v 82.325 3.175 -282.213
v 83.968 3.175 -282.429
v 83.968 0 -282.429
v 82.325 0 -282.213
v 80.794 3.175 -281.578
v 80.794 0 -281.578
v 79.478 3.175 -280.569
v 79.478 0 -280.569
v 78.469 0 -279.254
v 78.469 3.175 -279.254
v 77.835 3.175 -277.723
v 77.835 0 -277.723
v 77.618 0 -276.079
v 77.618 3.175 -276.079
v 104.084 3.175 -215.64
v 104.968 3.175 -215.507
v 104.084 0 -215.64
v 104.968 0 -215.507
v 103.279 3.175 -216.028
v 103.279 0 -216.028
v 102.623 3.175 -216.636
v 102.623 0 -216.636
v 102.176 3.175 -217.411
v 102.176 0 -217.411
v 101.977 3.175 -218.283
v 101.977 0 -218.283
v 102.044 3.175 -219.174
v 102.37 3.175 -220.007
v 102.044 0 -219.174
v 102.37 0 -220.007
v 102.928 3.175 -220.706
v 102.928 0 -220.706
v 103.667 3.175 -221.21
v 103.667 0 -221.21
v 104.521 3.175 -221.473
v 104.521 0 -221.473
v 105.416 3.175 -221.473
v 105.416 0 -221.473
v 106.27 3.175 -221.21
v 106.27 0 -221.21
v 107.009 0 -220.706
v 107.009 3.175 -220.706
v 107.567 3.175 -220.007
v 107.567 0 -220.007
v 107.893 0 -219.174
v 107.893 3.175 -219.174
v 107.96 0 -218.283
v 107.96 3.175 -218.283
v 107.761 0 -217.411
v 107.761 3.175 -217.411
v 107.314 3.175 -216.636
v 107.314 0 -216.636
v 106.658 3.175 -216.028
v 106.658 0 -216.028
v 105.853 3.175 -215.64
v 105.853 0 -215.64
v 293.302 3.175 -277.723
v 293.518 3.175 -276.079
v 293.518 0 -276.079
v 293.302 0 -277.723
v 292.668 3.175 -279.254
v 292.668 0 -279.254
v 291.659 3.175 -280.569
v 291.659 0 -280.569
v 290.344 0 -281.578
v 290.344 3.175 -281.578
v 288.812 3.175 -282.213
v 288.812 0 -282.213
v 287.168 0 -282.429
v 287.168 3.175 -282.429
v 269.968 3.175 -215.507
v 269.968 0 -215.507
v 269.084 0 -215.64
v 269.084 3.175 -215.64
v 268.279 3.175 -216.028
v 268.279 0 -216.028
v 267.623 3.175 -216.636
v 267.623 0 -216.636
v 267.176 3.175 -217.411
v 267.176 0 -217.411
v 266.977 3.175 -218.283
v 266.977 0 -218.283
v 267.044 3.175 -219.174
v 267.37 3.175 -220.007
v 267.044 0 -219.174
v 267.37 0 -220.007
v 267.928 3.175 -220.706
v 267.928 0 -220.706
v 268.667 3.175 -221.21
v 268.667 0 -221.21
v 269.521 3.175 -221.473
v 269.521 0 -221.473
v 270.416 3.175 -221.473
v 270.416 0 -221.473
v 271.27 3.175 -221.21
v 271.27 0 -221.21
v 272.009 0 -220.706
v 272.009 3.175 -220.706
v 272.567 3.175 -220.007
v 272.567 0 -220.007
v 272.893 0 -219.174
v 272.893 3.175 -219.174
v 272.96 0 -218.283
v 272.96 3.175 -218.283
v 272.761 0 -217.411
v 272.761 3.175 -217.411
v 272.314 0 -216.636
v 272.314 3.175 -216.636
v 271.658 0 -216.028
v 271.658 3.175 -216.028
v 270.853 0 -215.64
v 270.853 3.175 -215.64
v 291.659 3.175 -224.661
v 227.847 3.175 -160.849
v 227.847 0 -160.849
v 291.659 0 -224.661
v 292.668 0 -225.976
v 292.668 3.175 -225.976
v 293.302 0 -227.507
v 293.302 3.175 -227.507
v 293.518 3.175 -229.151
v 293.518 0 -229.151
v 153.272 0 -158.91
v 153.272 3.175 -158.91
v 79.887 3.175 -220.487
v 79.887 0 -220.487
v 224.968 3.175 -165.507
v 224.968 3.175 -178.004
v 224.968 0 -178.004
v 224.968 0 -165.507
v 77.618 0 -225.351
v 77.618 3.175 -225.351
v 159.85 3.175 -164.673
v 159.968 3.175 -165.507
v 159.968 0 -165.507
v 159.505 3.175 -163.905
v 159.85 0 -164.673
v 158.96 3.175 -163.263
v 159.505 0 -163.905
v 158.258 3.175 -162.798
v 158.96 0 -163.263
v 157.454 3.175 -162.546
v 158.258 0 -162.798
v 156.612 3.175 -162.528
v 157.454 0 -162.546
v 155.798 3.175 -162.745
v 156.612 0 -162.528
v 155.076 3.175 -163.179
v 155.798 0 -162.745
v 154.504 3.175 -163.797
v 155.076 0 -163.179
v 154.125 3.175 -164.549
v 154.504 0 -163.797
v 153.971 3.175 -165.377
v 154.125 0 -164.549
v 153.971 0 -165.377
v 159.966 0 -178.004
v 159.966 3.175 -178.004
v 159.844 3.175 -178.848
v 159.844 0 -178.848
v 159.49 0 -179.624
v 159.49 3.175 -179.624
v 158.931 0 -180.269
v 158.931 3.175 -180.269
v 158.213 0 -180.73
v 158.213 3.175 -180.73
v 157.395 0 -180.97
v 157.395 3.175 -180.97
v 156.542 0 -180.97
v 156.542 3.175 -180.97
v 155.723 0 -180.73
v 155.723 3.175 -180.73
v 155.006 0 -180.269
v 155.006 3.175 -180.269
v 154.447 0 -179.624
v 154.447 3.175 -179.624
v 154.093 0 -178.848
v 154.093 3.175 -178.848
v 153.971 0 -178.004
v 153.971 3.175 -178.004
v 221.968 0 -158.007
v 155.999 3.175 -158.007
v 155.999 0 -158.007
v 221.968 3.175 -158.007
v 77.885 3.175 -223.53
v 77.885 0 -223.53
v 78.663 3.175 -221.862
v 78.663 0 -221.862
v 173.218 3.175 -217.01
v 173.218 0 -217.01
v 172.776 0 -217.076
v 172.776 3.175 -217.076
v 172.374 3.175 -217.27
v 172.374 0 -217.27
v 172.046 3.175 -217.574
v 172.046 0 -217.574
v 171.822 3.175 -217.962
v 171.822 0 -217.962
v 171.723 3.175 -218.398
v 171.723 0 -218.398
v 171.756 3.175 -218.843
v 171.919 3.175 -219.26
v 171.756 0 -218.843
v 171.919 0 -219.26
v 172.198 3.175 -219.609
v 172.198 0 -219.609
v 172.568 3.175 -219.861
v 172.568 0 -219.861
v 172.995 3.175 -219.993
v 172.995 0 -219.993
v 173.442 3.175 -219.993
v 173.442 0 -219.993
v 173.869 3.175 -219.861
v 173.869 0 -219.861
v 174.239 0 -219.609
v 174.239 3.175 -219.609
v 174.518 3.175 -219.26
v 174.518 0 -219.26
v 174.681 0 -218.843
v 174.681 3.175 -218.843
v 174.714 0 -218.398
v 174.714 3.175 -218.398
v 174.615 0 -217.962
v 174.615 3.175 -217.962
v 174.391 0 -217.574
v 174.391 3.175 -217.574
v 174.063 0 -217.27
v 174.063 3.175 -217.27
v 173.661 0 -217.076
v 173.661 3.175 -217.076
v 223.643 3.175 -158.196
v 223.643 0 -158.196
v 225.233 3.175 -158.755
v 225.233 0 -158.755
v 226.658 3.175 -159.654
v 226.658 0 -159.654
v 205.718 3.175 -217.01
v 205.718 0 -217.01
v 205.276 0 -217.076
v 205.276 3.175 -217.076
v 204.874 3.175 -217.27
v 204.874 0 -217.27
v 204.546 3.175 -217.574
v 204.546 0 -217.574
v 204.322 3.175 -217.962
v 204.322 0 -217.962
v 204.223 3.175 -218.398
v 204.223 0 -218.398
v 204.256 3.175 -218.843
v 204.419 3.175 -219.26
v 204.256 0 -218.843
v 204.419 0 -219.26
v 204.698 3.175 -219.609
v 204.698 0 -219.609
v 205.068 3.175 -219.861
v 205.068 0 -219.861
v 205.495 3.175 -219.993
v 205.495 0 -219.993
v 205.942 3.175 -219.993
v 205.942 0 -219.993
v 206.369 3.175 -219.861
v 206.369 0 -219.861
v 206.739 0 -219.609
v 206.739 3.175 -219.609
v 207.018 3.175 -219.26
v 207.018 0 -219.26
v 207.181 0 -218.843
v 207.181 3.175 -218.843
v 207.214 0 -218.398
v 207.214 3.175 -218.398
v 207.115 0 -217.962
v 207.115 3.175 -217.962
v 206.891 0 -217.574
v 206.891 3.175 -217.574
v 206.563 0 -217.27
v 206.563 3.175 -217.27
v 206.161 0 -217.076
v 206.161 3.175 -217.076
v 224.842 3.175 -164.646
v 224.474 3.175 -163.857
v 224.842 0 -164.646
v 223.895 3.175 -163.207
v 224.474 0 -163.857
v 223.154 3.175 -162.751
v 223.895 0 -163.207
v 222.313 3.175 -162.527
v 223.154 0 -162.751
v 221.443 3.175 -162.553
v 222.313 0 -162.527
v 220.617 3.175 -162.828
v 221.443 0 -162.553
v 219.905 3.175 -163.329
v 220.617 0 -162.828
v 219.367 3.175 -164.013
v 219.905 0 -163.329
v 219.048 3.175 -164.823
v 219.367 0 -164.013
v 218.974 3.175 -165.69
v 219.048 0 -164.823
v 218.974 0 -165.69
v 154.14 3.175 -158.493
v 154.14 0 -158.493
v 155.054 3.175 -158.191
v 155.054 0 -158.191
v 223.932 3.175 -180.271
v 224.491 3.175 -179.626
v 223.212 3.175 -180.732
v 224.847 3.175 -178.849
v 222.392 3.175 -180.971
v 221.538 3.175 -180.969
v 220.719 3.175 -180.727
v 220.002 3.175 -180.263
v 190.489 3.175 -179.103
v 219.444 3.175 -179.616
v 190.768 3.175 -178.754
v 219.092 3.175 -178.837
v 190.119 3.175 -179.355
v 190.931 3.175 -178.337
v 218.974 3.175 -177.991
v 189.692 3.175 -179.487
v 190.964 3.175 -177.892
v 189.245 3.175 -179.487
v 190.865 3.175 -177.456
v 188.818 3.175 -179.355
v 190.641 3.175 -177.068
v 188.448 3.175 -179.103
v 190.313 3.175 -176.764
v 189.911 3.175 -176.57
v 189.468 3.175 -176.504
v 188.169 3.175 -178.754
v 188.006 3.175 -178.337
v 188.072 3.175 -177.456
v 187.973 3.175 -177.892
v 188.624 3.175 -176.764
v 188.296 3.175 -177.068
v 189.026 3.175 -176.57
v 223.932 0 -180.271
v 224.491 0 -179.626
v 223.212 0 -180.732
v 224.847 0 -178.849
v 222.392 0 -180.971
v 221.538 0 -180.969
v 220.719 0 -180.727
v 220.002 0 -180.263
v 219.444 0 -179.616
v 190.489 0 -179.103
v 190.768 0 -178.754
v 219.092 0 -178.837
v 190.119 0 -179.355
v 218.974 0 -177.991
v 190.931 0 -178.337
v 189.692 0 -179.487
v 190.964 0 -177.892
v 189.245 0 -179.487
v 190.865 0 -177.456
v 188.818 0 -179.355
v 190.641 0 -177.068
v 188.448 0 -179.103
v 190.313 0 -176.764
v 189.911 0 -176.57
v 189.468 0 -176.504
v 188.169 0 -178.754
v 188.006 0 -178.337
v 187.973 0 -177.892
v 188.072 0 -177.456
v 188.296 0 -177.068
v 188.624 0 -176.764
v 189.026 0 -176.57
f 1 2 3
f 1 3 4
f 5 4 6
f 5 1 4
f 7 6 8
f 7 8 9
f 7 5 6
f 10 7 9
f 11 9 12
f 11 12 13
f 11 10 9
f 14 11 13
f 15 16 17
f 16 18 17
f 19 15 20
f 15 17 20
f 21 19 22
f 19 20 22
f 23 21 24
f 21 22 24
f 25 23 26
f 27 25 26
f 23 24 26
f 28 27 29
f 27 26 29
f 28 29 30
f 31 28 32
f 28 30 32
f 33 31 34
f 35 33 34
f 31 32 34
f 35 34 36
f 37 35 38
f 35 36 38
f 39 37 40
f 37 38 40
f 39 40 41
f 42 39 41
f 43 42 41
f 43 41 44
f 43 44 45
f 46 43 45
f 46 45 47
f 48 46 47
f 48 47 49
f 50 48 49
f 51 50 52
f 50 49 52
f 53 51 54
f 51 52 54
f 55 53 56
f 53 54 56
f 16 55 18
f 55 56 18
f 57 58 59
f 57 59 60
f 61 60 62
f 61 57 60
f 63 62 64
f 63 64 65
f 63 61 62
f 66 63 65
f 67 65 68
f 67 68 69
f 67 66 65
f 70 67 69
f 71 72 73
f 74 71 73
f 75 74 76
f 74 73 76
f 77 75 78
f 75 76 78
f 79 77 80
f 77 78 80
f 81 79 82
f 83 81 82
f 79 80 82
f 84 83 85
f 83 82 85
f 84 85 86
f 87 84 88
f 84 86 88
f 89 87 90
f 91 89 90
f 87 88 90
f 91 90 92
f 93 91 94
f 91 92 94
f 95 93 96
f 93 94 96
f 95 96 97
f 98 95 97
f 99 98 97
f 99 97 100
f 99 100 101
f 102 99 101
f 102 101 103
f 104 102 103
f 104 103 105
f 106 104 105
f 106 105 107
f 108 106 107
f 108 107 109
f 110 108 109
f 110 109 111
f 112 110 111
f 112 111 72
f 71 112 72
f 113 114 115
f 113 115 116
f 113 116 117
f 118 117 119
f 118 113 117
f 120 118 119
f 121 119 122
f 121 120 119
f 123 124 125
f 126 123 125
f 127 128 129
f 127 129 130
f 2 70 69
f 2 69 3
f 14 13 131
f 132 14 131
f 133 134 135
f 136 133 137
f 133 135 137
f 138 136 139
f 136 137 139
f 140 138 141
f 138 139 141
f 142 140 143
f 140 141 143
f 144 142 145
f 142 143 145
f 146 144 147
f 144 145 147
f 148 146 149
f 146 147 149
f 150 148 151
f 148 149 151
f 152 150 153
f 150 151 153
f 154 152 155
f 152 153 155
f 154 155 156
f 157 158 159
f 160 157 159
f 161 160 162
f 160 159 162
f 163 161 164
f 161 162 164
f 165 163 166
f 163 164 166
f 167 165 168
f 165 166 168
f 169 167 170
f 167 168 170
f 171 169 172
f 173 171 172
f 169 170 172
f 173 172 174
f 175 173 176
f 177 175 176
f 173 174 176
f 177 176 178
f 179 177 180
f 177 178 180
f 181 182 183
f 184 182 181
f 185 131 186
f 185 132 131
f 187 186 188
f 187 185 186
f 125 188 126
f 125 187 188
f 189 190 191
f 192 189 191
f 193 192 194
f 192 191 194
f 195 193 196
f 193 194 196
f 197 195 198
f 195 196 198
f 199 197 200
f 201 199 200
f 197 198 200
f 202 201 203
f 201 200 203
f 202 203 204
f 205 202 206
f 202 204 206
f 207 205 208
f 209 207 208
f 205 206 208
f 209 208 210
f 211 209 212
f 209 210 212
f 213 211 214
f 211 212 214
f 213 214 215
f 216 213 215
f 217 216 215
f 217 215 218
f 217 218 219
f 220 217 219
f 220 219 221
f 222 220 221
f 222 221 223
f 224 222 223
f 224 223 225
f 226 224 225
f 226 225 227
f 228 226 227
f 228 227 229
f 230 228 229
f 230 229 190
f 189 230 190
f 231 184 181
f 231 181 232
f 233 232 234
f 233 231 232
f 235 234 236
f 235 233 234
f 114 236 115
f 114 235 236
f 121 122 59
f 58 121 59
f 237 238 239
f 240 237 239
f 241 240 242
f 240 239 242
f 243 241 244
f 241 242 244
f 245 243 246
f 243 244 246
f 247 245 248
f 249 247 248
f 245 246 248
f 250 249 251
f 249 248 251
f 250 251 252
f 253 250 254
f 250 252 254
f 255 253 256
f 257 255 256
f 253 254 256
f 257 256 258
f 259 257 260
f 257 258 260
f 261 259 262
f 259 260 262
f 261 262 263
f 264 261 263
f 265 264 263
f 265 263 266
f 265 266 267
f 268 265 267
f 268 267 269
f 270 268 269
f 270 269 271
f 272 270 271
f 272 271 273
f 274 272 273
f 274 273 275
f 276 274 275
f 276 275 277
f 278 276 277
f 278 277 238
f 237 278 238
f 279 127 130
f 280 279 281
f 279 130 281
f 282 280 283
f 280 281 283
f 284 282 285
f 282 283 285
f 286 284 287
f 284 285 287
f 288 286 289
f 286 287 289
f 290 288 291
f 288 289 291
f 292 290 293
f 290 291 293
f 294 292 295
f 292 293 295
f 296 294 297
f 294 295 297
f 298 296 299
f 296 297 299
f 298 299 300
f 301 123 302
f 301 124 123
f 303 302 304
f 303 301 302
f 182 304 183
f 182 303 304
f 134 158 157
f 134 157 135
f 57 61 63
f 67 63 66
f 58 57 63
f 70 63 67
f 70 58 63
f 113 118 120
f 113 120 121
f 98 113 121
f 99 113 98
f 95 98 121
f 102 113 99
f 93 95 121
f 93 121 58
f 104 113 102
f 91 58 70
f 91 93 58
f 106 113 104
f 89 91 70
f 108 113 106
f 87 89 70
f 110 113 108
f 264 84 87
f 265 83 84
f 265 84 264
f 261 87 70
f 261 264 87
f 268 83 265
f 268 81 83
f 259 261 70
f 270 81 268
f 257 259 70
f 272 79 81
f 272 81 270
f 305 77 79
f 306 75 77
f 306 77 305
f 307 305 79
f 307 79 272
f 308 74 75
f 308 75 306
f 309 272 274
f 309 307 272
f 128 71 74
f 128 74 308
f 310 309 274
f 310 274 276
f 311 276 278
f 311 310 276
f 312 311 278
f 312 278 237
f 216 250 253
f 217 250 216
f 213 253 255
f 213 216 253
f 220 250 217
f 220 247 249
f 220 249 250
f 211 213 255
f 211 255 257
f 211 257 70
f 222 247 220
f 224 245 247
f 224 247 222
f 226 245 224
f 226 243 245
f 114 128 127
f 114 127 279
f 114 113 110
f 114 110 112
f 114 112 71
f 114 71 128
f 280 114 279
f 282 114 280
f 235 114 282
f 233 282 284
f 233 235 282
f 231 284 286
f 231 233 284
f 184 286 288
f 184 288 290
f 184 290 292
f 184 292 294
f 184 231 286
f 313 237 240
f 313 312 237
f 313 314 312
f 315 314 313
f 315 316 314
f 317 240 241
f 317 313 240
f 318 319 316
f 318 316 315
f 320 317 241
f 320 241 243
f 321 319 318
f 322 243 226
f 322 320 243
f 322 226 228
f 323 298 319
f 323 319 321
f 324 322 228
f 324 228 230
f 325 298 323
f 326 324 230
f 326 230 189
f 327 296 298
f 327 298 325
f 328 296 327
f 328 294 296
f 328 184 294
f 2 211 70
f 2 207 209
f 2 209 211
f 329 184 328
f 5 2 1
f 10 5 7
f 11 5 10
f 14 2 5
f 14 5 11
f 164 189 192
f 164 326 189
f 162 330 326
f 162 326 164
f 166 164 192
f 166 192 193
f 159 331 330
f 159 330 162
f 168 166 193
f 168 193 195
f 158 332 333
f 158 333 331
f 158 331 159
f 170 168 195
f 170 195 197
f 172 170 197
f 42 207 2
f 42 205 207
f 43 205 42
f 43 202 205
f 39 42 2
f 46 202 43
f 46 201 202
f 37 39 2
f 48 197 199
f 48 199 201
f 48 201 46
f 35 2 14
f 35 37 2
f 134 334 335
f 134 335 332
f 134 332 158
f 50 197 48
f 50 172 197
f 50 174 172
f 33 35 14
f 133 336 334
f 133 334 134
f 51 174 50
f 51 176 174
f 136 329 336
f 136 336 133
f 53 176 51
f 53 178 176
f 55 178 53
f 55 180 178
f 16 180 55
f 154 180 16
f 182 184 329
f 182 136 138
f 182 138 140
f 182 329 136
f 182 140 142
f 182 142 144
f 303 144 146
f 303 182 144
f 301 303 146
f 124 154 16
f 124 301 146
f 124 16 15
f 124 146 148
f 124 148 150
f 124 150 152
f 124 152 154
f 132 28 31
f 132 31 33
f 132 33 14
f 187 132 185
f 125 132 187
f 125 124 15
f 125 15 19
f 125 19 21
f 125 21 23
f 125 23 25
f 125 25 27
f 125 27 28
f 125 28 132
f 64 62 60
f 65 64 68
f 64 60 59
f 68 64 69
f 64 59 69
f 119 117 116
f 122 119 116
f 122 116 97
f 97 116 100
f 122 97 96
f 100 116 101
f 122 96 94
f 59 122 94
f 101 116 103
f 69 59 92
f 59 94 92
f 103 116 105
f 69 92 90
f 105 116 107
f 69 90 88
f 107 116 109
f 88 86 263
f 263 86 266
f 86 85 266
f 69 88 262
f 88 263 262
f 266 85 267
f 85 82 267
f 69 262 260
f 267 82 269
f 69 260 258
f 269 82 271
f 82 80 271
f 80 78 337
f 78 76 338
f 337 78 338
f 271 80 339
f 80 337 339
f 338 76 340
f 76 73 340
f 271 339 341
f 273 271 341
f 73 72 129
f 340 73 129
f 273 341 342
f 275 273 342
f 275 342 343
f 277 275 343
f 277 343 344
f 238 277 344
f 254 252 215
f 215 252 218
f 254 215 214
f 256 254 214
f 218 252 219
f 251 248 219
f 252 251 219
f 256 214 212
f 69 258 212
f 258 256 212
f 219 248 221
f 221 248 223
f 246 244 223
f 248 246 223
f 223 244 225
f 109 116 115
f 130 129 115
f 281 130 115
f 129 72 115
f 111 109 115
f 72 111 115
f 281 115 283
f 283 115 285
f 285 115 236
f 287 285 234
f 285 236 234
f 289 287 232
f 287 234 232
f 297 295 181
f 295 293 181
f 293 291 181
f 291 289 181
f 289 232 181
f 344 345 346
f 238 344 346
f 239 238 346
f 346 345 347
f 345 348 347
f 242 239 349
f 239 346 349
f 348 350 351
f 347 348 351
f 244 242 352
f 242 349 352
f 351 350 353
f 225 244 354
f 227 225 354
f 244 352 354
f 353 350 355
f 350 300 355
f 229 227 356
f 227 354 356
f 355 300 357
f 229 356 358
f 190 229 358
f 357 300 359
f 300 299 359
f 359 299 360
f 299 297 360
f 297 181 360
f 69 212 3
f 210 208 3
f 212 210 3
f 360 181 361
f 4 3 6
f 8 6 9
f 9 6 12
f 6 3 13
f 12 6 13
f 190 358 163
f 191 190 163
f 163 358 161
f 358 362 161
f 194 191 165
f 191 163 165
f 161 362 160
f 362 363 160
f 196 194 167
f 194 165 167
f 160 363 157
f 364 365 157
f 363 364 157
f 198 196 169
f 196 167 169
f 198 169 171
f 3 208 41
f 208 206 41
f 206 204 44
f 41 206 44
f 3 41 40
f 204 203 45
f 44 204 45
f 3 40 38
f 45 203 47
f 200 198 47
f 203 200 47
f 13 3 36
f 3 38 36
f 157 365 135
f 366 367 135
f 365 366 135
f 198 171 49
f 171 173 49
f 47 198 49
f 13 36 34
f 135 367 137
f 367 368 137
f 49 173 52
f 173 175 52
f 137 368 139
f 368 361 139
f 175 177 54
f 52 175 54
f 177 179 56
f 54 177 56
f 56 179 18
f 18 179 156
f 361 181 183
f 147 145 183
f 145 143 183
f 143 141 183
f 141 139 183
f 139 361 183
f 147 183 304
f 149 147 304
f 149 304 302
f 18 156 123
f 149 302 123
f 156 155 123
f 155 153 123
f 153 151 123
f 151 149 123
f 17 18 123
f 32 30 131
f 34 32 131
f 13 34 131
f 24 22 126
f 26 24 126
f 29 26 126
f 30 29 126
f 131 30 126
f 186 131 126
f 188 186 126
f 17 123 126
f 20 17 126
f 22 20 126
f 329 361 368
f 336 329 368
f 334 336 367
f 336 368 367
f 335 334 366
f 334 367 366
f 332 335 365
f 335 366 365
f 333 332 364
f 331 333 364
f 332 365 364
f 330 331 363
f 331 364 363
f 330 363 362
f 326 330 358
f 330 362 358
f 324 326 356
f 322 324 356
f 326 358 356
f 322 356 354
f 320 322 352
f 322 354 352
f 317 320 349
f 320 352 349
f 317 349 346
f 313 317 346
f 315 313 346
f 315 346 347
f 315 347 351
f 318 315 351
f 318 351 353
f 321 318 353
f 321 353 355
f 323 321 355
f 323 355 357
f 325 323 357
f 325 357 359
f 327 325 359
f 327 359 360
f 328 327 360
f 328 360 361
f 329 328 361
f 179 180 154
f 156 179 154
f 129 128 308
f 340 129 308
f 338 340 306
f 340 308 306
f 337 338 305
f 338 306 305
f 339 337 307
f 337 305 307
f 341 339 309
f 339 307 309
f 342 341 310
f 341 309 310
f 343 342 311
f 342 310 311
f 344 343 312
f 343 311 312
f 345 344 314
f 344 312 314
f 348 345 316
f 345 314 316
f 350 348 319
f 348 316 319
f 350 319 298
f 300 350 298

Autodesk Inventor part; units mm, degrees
ref_plane "YZ Plane" through (0, 0, 0) normal (1, 0, 0) x (0, 1, 0)
ref_plane "XZ Plane" through (0, 0, 0) normal (0, 1, 0) x (-1, 0, 0)
ref_plane "XY Plane" through (0, 0, 0) normal (0, 0, 1) x (1, 0, 0)
sketch "Sketch1" plane through (0, 0, 0) normal (0, 1, 0) x (-1, 0, 0)
  line L0 (-77.6185, -139.5068) -> (-293.5185, -139.5068)
  line L1 (-293.5185, -139.5068) -> (-293.5185, -291.9068)
  line L2 (-293.5185, -291.9068) -> (-77.6185, -291.9068)
  line L3 (-77.6185, -291.9068) -> (-77.6185, -139.5068)
  point P0 (0, 0)
  dimension "d0" = 215.9
  dimension "d1" = 152.4
extrude "Extrusion1" add sketch "Sketch1" along normal blind 3.175
sketch "Sketch2" plane through (0, 3.175, 0) normal (0, 1, 0) x (1, 0, 0)
  line L0 (77.6185, 291.9068) -> (77.6185, 139.5068) projected
  line L1 (77.6185, 139.5068) -> (293.5185, 139.5068) projected
  line L2 (293.5185, 139.5068) -> (293.5185, 291.9068) projected
  line L3 (293.5185, 291.9068) -> (77.6185, 291.9068) projected
  point P0 (0, 0)
  point P1 (156.9685, 165.5068)
  point P2 (104.9685, 218.5068)
  point P3 (269.9685, 218.5068)
  point P4 (221.9685, 165.5068)
  dimension "d4" = 144.35
  dimension "d5" = 26
  dimension "d7" = 79
  dimension "d19" = 27.35
  dimension "d20" = 79
  dimension "d21" = 26
  dimension "d22" = 79.35
  dimension "d23" = 192.35
hole "Hole1" at (156.9685, 3.175, -165.5068) at (104.9685, 3.175, -218.5068) at (269.9685, 3.175, -218.5068) at (221.9685, 3.175, -165.5068) direction (0, -1, 0) diameter 6 end through all
sketch "Sketch3" plane through (0, 3.175, 0) normal (0, 1, 0) x (1, 0, 0)
  line L0 (155.9994, 158.0068) -> (221.9685, 158.0068)
  circle A0 centre (221.9685, 165.5068) radius 3 projected
  circle A1 centre (104.3905, 218.5068) radius 3
  circle A2 centre (156.9685, 165.5068) radius 3 projected
  line L1 (153.2717, 158.9097) -> (79.8868, 220.4869)
  line L2 (77.6185, 139.5068) -> (293.5185, 139.5068)
  line L3 (293.5185, 229.1509) -> (293.5185, 276.0791)
  line L4 (293.5185, 291.9068) -> (77.6185, 291.9068)
  line L5 (77.6185, 291.9068) -> (77.6185, 139.5068)
  arc A3 (153.2717, 158.9097) -> (155.9994, 158.0068) centre (156.9685, 165.5068) ccw
  line L6 (96.6333, 206.4349) -> (77.6185, 222.3902)
  line L7 (48.2791, 233.5068) -> (391.5458, 233.5068) construction
  arc A4 (221.9685, 158.0068) -> (227.8466, 160.8487) centre (221.9685, 165.5068) ccw
  line L8 (227.8466, 160.8487) -> (291.6586, 224.6608)
  line L9 (293.5185, 226.5206) -> (293.5185, 282.4291)
  line L10 (293.5185, 139.5068) -> (293.5185, 291.9068) projected
  line L11 (287.1685, 282.4291) -> (83.9685, 282.4291)
  line L12 (77.6185, 276.0791) -> (77.6185, 225.3513)
  line L13 (77.6185, 291.9068) -> (77.6185, 139.5068) projected
  arc A5 (293.5185, 276.0791) -> (287.1685, 282.4291) centre (287.1685, 276.0791) ccw
  arc A6 (83.9685, 282.4291) -> (77.6185, 276.0791) centre (83.9685, 276.0791) ccw
  arc A7 (77.6185, 225.3513) -> (79.8868, 220.4869) centre (83.9685, 225.3513) ccw
  arc A8 (291.6586, 224.6608) -> (293.5185, 229.1509) centre (287.1685, 229.1509) ccw
  point P0 (0, 0)
  point P1 (77.6185, 282.4291)
  point P2 (77.6185, 160.8487)
  dimension "d24" = 7.5
  dimension "d40" = 98.7582
  dimension "d72" = 6
  dimension "d93" = 7.5
  dimension "d96" = 52.578
  dimension "d99" = 135
  dimension "d100" = 6.35
  dimension "d101" = 6.35
  dimension "d102" = 6.35
  dimension "d103" = 6.35
  dimension "d104" = 140
extrude "Extrusion3" cut sketch "Sketch3" against normal blind 25.4 contours L0 A4 L8 A8 L9 L10 L2 L5 L6 L1 A3 | L6 L5 A7 | A5 L11 A6 L5 L4 L10 L9
sketch "Sketch7" plane through (0, 3.175, 0) normal (0, 1, 0) x (1, 0, 0)
  circle A0 centre (156.9685, 165.5068) radius 3 projected
  line L0 (155.9994, 158.0068) -> (221.9685, 158.0068) projected
  circle A1 centre (156.9685, 178.0036) radius 2.9972
  line L1 (153.9713, 178.0036) -> (153.9713, 165.3773)
  line L2 (159.9657, 178.0043) -> (159.9685, 165.5075)
  circle A2 centre (221.9713, 178.0036) radius 2.9972
  circle A3 centre (221.9685, 165.5068) radius 3 projected
  line L3 (218.9741, 178.016) -> (218.9741, 165.3232)
  line L4 (224.9685, 178.0036) -> (224.9685, 165.5068)
  point P0 (0, 0)
  point P1 (218.9685, 165.5082)
  dimension "d76" = 5.9944
  dimension "d77" = 12.4968
  dimension "d78" = 5.9944
  dimension "d79" = 12.4968
  dimension "d88" = 6
extrude "Extrusion4" cut sketch "Sketch7" against normal blind 25.4 contours A0 L1 A1 L2 | A1
sketch "Sketch8" plane through (0, 3.175, 0) normal (0, 1, 0) x (1, 0, 0)
  arc A0 (224.9685, 178.0036) -> (218.9741, 177.9913) centre (221.9713, 178.0036) ccw
  circle A1 centre (221.9685, 165.5068) radius 3
  line L0 (218.9741, 178.016) -> (218.9741, 165.3232)
  line L1 (224.9685, 178.0036) -> (224.9685, 165.5068)
  point P0 (0, 0)
  point P1 (218.9685, 165.5082)
  dimension "d82" = 5.9944
  dimension "d83" = 12.4968
extrude "Extrusion5" cut sketch "Sketch8" against normal blind 25.4 contours L1 A1 L0 A0 | A1 L0 picked at (221.9464, 164.5591)
sketch "Sketch9" plane through (0, 3.175, 0) normal (0, 1, 0) x (1, 0, 0)
  point P0 (0, 0)
sketch "Sketch5" plane through (0, 3.175, 0) normal (0, 1, 0) x (1, 0, 0)
  circle A0 centre (104.9685, 218.5068) radius 3 projected
  circle A1 centre (104.9685, 218.5068) radius 22.225
  circle A2 centre (156.9685, 165.5068) radius 3 projected
  circle A3 centre (156.9685, 165.5068) radius 22.225
  circle A4 centre (221.9685, 165.5068) radius 3 projected
  circle A5 centre (221.9685, 165.5068) radius 22.225
  circle A6 centre (269.9685, 218.5068) radius 3 projected
  circle A7 centre (269.9685, 218.5068) radius 22.225
  line L0 (155.9994, 158.0068) -> (221.9685, 158.0068) projected
  line L1 (274.8943, 278.8204) -> (98.1742, 278.8204) projected
  arc A8 (224.9685, 178.0036) -> (218.9741, 178.016) centre (221.9713, 178.0036) ccw projected
  point P0 (0, 0)
  point P1 (205.7185, 218.5096)
  point P2 (189.4685, 178.0036)
  point P3 (173.2185, 218.5096)
  dimension "d45" = 44.45
  dimension "d47" = 44.45
  dimension "d48" = 44.45
  dimension "d49" = 44.45
  dimension "d50" = 60.5028
  dimension "d52" = 65
  dimension "d53" = 16.25
  dimension "d54" = 16.25
  dimension "d55" = 60.5028
  dimension "d58" = 52
  dimension "d62" = 32.5
  dimension "d95" = 60.3136
  dimension "d125" = 0
hole "Hole2" at (205.7185, 3.175, -218.5096) at (189.4685, 3.175, -178.0036) at (173.2185, 3.175, -218.5096) direction (0, -1, 0) diameter 3 end through all
sketch "Sketch11" plane through (0, 3.175, 0) normal (0, 1, 0) x (1, 0, 0)
  circle A0 centre (18.0131, 10.4316) radius 1.3525
  circle A1 centre (18.0131, 10.4316) radius 1.3525
  circle A2 centre (18.0131, 24.2612) radius 1.3525
  circle A3 centre (18.0131, 24.2612) radius 1.3525
  circle A4 centre (31.8426, 24.2612) radius 1.3525
  circle A5 centre (31.8426, 24.2612) radius 1.3525
  circle A6 centre (31.8426, 10.4316) radius 1.3525
  circle A7 centre (31.8426, 10.4316) radius 1.3525
  circle A8 centre (104.9685, 218.5068) radius 3 projected
  point P0 (0, 0)
  point P1 (24.9279, 17.3464)
  point P2 (24.9279, 17.3464)
  dimension "d126" = 13.8296
  dimension "d127" = 13.8296
  dimension "d128" = 6.9148
  dimension "d129" = 6.9148
equation "\"d78\" = d76"
equation "\"d79\" = d77"
equation "\"d82\" = d84"
equation "\"d83\" = d85"
equation "\"d47\" = d45"
equation "\"d48\" = d45"
equation "\"d49\" = d48"
equation "\"d53\" = 0.25 * d52"
equation "\"d54\" = d53"
equation "\"d55\" = d50"
equation "\"d62\" = 0.5 * d52"
equation "\"d84\" = 5.9944"
equation "\"d85\" = 12.4968"
properties part number "track side panel V1"
